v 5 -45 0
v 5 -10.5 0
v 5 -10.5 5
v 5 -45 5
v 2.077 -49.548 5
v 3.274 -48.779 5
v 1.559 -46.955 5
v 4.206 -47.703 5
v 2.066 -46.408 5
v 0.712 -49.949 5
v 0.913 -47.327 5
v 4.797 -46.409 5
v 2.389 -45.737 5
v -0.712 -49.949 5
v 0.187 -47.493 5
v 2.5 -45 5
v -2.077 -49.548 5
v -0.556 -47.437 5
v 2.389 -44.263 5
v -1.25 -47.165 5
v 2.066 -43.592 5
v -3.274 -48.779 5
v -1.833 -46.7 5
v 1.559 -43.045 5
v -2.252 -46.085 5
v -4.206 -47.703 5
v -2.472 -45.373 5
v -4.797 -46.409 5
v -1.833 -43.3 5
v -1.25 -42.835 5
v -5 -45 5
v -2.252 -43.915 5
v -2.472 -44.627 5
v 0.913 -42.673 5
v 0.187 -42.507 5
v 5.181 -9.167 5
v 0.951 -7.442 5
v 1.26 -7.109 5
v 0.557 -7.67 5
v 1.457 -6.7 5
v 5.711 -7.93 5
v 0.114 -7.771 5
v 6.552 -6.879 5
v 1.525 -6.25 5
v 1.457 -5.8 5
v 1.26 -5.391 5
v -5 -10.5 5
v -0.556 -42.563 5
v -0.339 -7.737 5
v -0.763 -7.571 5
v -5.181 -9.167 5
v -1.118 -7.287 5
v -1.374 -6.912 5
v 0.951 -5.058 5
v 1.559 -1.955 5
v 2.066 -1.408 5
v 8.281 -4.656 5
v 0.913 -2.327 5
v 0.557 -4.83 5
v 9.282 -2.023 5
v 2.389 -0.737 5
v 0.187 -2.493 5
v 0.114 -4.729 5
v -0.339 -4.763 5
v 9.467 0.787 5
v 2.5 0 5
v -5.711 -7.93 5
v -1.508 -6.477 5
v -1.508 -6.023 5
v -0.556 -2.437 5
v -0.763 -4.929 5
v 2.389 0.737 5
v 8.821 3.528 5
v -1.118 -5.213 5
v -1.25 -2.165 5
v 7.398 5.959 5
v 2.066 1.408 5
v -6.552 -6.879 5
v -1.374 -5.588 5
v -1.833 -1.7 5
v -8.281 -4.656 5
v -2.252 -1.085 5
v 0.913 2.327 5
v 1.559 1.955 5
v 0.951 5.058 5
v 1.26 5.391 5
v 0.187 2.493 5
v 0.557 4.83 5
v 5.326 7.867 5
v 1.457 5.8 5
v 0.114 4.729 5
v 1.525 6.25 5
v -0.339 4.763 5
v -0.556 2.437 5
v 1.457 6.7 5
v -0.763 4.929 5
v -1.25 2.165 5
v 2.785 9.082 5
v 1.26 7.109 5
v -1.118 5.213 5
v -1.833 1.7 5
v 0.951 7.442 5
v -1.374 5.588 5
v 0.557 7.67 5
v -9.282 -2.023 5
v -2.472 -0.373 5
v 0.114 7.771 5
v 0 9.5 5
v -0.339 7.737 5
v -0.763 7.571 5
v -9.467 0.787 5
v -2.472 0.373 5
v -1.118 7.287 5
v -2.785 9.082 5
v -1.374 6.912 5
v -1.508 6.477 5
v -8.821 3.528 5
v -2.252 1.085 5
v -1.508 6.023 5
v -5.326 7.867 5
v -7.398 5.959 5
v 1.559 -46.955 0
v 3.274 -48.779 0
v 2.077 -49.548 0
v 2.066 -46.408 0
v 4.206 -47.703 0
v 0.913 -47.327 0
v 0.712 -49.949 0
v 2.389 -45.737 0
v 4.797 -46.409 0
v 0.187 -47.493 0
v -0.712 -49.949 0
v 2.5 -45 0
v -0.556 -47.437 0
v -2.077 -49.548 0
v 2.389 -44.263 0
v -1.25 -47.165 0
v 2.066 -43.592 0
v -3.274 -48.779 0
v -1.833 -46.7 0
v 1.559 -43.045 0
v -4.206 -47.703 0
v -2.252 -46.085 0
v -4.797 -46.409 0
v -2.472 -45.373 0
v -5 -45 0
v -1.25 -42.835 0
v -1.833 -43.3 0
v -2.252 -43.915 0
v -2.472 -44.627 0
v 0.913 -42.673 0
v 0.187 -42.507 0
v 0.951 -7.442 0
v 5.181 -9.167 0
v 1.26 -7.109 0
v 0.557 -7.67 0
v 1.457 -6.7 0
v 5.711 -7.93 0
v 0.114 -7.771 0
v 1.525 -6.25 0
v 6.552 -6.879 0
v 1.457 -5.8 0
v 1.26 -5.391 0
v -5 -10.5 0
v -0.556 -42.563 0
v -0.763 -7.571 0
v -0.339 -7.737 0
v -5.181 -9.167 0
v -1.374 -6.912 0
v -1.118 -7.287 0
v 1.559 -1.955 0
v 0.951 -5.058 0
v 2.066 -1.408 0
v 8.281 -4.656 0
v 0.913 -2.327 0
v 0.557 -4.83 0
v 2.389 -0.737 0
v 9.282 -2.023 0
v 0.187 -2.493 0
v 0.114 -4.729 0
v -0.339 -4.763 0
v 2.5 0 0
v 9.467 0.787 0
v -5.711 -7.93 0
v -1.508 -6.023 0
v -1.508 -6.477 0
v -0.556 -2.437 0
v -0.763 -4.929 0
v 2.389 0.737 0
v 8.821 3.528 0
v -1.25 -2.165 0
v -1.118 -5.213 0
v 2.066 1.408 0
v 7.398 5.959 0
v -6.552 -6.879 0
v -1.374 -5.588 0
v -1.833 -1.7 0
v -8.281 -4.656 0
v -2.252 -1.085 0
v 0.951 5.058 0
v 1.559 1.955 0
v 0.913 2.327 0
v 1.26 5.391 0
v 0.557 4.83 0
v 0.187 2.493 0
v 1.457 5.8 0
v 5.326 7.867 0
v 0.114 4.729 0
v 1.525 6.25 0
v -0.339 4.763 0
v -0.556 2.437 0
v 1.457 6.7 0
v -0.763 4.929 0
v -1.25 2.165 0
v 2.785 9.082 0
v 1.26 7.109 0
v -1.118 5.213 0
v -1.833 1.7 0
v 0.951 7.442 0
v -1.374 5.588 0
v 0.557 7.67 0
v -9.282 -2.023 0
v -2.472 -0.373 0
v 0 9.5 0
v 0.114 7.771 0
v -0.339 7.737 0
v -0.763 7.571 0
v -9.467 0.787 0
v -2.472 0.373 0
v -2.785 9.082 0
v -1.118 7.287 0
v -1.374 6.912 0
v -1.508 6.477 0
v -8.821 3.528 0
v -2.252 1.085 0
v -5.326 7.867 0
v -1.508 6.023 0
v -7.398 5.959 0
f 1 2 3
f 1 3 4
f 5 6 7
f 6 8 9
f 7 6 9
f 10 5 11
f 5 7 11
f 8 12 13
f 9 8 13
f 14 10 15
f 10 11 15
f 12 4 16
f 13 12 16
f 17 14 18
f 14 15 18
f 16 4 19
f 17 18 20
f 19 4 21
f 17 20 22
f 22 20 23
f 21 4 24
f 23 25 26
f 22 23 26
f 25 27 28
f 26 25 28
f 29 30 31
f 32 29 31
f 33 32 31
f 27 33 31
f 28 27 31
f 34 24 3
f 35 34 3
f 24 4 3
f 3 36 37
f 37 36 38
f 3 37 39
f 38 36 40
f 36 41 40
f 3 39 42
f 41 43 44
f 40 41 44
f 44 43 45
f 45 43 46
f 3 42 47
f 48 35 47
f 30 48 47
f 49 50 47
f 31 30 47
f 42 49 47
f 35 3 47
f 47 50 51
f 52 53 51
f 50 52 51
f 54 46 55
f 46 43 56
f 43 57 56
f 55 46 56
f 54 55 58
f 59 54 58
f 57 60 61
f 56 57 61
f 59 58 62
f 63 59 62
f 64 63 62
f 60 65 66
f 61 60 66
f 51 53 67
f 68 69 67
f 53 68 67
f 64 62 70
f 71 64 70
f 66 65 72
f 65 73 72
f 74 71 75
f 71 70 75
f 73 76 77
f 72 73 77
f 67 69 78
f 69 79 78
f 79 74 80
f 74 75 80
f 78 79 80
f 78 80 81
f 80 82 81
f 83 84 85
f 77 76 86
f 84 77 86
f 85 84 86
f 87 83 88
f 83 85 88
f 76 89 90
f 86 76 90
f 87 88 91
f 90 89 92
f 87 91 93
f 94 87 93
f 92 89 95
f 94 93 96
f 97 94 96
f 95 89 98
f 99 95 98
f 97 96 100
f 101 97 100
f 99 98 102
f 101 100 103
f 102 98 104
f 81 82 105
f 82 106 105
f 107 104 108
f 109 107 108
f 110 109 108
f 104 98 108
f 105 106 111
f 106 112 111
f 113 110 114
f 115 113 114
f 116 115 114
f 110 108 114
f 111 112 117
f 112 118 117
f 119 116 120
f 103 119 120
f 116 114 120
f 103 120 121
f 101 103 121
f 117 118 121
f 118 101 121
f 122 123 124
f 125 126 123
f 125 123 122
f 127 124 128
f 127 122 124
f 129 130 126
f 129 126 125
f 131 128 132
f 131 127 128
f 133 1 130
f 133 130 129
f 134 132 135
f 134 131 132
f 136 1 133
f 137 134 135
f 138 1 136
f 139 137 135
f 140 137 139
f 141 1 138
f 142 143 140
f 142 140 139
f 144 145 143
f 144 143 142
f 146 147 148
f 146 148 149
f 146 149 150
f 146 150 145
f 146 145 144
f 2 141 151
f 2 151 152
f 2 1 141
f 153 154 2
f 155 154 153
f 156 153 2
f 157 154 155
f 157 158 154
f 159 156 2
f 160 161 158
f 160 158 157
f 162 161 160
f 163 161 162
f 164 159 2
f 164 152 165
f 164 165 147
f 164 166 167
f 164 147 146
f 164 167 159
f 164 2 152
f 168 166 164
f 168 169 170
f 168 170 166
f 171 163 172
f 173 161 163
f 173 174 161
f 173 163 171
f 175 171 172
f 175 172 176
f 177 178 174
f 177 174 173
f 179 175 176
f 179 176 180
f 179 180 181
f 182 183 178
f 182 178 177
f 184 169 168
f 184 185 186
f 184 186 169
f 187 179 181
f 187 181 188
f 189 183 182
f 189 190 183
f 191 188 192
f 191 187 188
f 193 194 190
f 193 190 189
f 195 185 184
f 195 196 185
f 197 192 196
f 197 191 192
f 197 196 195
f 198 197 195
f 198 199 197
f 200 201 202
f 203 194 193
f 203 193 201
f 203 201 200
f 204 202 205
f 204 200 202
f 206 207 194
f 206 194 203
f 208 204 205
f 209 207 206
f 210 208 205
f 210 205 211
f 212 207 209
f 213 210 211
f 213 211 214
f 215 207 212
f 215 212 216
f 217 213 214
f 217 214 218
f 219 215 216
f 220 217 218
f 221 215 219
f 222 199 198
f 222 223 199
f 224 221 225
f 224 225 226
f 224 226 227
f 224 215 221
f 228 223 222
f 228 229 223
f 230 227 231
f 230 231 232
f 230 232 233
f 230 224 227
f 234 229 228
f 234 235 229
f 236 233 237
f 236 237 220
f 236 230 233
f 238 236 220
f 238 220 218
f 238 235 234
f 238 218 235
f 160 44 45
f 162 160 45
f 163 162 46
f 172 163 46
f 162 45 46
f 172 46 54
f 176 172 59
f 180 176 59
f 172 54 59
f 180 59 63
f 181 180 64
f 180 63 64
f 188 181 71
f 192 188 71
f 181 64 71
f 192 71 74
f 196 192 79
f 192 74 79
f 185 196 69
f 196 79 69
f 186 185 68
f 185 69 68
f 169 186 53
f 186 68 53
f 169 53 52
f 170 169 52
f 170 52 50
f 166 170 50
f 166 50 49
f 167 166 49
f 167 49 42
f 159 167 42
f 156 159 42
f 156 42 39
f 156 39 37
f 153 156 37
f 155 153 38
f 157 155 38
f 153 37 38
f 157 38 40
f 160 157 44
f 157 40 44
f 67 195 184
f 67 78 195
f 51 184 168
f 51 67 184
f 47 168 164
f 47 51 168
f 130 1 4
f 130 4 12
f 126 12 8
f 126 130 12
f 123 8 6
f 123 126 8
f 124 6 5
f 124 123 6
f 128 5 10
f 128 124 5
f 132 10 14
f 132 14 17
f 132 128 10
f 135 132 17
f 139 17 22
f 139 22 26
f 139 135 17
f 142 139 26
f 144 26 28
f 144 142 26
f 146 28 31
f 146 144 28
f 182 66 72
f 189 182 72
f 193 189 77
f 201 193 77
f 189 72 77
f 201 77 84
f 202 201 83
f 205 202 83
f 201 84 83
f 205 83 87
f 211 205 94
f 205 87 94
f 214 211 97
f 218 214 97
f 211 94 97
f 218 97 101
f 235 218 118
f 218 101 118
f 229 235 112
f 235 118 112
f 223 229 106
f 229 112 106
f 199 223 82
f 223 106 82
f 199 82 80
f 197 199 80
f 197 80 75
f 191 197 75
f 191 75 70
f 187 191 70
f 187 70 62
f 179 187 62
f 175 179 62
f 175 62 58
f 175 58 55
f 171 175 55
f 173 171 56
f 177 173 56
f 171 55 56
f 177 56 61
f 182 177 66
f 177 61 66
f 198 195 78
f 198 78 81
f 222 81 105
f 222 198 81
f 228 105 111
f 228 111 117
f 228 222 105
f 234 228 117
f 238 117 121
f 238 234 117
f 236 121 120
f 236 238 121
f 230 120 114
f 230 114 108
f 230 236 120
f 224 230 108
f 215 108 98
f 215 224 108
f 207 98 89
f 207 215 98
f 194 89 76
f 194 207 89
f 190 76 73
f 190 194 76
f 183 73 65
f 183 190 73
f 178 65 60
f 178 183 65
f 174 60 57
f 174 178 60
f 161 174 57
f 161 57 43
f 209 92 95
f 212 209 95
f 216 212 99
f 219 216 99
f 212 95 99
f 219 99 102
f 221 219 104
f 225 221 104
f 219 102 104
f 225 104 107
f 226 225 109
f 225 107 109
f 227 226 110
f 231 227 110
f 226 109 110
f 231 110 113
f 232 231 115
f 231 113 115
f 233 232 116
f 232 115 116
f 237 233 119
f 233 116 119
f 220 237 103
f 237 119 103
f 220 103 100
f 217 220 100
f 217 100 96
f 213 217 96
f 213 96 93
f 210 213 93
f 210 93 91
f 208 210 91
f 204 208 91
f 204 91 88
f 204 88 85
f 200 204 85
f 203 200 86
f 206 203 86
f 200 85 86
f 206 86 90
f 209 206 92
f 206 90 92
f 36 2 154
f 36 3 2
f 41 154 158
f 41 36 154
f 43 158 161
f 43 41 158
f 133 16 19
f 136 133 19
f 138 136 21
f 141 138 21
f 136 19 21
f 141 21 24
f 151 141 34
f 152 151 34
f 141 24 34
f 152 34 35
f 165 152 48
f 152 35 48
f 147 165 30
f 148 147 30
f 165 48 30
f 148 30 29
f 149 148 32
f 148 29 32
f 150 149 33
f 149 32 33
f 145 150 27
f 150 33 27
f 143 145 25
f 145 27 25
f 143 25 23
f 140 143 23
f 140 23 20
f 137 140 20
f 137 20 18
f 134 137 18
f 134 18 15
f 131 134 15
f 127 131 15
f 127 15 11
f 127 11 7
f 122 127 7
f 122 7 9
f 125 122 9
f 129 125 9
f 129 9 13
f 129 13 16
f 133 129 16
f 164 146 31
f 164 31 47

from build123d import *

# Parameters (mm, degrees)
EXTRUDE_1_DEPTH     = 5
SKETCH_3_R          = 2.5
CUT_EXTRUDE_1_DEPTH = 24
SKETCH_4_R          = 1.525
CUT_EXTRUDE_2_DEPTH = 5
SKETCH_5_R          = 2.5
CUT_EXTRUDE_3_DEPTH = 5
FILLET_1_R          = 5


with BuildPart() as part:
    # 草图1 → 凸台-拉伸1 (new body)
    with BuildSketch(Plane.XY):
        with BuildLine():
            Line((5, -8.077747211), (5, -45))
            ThreePointArc((5, -45), (0, -50), (-5, -45))
            Line((-5, -45), (-5, -8.077747211))
            ThreePointArc((-5, -8.077747211), (0, 9.5), (5, -8.077747211))
        make_face()
    extrude(amount=EXTRUDE_1_DEPTH)

    # 草图3 → 切除-拉伸1 (cut)
    with BuildSketch(Plane.XY.offset(5)):
        with Locations((0, -45)):
            Circle(SKETCH_3_R)
    extrude(amount=-CUT_EXTRUDE_1_DEPTH, mode=Mode.SUBTRACT)

    # 草图4 → 切除-拉伸2 (cut)
    with BuildSketch(Plane.XY.offset(5)):
        with Locations((0, 6.25)):
            Circle(SKETCH_4_R)
        with Locations((0, -6.25)):
            Circle(SKETCH_4_R)
    extrude(amount=-CUT_EXTRUDE_2_DEPTH, mode=Mode.SUBTRACT)

    # 草图5 → 切除-拉伸3 (cut)
    with BuildSketch(Plane.XY.offset(5)):
        Circle(SKETCH_5_R)
    extrude(amount=-CUT_EXTRUDE_3_DEPTH, mode=Mode.SUBTRACT)

    # 圆角1
    fillet_1_edges = [part.edges().sort_by_distance(p)[0] for p in [
        (-5, -8.077747211, 2.5),
        (5, -8.077747211, 2.5),
    ]]
    fillet(fillet_1_edges, radius=FILLET_1_R)


solid = part.part
